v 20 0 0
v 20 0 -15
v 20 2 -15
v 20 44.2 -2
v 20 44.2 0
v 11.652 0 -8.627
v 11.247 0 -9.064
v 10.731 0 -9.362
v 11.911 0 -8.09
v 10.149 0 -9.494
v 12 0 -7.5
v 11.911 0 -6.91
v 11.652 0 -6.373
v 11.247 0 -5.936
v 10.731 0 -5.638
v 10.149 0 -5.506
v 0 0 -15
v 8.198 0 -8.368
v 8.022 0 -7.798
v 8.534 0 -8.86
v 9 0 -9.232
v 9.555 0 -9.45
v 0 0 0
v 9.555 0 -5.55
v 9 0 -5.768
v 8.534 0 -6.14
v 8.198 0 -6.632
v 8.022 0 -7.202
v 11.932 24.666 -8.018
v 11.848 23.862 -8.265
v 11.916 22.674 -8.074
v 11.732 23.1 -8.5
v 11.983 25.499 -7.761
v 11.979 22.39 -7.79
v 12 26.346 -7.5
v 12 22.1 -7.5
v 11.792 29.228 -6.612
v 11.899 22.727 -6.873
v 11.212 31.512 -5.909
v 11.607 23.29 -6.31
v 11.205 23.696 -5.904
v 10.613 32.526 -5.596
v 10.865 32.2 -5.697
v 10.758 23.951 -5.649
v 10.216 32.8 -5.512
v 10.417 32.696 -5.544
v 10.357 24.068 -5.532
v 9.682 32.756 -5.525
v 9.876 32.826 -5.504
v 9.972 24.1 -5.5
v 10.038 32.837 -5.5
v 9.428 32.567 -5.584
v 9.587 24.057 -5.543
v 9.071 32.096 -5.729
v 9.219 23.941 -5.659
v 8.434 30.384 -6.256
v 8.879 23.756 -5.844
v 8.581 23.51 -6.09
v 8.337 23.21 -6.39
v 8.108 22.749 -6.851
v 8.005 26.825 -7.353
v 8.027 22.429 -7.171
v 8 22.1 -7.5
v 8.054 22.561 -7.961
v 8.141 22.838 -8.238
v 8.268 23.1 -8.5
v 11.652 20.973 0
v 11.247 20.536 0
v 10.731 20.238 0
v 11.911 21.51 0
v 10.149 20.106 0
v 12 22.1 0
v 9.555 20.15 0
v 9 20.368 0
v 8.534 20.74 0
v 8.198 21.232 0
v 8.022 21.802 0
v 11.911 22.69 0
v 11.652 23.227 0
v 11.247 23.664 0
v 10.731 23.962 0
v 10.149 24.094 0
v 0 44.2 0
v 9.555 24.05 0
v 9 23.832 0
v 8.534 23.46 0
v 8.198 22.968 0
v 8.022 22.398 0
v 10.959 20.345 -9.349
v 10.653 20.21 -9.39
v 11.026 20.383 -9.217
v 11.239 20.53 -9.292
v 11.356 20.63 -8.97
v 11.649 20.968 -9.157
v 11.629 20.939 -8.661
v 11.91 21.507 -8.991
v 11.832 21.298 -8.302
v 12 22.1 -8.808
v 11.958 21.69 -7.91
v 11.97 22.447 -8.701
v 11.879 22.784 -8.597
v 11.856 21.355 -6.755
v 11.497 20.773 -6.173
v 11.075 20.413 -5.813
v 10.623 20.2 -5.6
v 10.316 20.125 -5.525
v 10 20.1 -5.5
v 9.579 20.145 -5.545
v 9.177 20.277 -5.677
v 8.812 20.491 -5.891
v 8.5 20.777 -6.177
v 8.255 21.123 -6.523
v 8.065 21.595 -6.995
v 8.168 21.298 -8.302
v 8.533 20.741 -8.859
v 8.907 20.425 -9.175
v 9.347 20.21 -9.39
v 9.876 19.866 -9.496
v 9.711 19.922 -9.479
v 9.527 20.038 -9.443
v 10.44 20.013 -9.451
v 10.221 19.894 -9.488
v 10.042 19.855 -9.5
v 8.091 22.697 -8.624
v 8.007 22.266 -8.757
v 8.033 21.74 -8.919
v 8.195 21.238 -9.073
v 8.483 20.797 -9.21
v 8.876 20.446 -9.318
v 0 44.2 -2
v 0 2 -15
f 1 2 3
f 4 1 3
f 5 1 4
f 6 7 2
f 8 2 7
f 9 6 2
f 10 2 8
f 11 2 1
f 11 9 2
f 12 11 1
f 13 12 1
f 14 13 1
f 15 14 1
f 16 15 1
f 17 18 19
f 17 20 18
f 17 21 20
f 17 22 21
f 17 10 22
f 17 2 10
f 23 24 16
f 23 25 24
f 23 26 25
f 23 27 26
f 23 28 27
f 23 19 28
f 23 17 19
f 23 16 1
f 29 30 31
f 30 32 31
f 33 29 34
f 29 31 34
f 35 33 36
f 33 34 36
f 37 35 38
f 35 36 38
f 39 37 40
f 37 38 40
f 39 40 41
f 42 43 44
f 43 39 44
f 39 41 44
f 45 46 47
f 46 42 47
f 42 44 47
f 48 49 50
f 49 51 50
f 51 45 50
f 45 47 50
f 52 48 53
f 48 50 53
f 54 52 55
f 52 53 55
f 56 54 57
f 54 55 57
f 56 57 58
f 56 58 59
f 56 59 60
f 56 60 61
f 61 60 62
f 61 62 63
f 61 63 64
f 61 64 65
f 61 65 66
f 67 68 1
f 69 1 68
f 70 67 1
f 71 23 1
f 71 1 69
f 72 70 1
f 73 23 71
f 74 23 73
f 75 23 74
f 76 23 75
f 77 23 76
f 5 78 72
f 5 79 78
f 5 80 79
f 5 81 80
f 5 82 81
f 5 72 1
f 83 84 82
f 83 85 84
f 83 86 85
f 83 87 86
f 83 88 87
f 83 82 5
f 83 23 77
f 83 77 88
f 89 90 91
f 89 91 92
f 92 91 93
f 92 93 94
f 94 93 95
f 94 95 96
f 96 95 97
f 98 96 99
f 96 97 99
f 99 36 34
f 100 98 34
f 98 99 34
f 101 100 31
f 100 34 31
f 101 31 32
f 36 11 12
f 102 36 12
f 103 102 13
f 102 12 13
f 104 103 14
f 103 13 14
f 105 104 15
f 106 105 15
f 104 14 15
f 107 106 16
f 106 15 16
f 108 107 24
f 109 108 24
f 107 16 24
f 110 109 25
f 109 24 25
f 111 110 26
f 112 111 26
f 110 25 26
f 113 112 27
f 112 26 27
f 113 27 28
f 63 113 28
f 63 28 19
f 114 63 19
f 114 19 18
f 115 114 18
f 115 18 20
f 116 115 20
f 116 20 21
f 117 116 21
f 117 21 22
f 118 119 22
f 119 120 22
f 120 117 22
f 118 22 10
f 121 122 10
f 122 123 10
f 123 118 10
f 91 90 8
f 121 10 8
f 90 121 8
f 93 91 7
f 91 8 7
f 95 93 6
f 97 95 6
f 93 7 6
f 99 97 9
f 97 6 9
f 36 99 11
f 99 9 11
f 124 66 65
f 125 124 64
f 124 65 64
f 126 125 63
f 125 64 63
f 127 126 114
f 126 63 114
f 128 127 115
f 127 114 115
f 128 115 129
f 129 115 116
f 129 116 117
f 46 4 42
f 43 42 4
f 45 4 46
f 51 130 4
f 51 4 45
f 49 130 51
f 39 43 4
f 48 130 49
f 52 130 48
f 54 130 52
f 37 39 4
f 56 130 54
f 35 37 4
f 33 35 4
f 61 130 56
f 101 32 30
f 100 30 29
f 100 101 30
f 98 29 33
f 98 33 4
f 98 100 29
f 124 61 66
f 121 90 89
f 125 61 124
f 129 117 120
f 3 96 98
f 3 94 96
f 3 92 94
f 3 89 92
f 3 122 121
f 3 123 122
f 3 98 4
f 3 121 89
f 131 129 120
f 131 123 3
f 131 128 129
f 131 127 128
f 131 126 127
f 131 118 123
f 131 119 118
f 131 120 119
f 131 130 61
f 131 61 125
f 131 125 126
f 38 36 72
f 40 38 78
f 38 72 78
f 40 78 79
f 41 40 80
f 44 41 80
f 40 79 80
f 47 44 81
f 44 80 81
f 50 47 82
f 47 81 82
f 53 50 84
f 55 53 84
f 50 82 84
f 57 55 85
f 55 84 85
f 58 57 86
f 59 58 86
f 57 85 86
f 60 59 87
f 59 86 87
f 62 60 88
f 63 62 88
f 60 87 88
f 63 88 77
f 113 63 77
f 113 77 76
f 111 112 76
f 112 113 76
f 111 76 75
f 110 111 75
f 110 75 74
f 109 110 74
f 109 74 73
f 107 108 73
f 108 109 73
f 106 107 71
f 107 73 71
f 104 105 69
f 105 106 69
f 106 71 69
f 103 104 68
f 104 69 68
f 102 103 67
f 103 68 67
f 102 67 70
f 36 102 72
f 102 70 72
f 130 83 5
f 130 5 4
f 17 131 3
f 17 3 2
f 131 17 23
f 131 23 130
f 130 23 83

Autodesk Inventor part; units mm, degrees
ref_plane "YZ Plane" through (0, 0, 0) normal (1, 0, 0) x (0, 1, 0)
ref_plane "XZ Plane" through (0, 0, 0) normal (0, 1, 0) x (-1, 0, 0)
ref_plane "XY Plane" through (0, 0, 0) normal (0, 0, 1) x (1, 0, 0)
sketch "Sketch2" plane through (0, 0, 0) normal (1, 0, 0) x (0, 1, 0)
  line L0 (0, 0) -> (44.2, 0)
  line L1 (44.2, 0) -> (44.2, -2)
  line L2 (44.2, -2) -> (2, -15)
  line L3 (2, -15) -> (0, -15)
  line L4 (0, -15) -> (0, 0)
  dimension "d0" = 44.2
  dimension "d1" = 2
  dimension "d2" = 2
  dimension "d3" = 15
extrude "Extrusion1" add sketch "Sketch2" along normal blind 20
sketch "Sketch3" plane through (0, 0, -15) normal (0, -1, 0) x (1, 0, 0)
  line L0 (0, 15) -> (20, 15) projected
  line L1 (0, 15) -> (20, 0) construction
  line L2 (0, 0) -> (0, 13) projected
  line L3 (20, 15) -> (0, 0) construction
  circle A0 centre (10, 7.5) radius 2
  dimension "d6" = 4
extrude "Extrusion2" cut sketch "Sketch3" against normal through all
sketch "Sketch4" plane through (0, 0, 0) normal (0, 0, 1) x (1, 0, 0)
  line L0 (20, 2) -> (20, 44.2) projected
  line L1 (20, 44.2) -> (0, 0) construction
  line L2 (20, 0) -> (20, 2) projected
  line L3 (0, 2) -> (0, 44.2) projected
  line L4 (20, 0) -> (0, 44.2) construction
  circle A0 centre (10, 22.1) radius 2
  dimension "d9" = 4
extrude "Extrusion3" cut sketch "Sketch4" against normal through all
properties part number "MM3_vertical"
